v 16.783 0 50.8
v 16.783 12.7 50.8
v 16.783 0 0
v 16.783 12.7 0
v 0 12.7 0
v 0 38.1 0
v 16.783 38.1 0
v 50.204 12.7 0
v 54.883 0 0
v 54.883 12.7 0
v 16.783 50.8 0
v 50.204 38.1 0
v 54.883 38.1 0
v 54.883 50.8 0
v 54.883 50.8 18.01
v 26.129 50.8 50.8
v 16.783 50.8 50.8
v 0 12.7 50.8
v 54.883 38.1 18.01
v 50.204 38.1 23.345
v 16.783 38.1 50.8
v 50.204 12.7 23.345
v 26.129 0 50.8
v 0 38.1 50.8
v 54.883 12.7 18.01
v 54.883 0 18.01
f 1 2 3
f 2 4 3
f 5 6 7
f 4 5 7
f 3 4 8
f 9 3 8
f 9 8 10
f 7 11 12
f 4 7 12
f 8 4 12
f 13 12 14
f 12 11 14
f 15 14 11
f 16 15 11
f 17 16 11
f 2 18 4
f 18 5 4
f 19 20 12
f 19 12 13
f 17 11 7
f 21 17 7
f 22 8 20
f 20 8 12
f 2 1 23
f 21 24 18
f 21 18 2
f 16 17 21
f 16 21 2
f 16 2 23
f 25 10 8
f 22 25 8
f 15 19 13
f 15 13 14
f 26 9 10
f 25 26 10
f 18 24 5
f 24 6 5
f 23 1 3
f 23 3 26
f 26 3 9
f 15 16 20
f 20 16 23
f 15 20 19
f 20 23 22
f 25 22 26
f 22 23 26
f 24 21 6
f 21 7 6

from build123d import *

# Parameters (mm, degrees)
F1_DEPTH = 25.4
F2_DEPTH = 25.4
F4_DEPTH = 68.58


with BuildPart() as f1:
    # F0 (on Top) → F1 (new body)
    with BuildSketch(Plane.XY):
        Polygon((16.782857, 38.1), (0, 38.1), (0, 12.7), (16.782857, 12.7), (16.782857, 0), (29.482857, 0), (29.482857, 50.8), (16.782857, 50.8), align=None)
        Polygon((54.882857, 50.8), (29.482857, 50.8), (29.482857, 0), (54.882857, 0), (54.882857, 12.7), (50.20391, 12.7), (50.20391, 38.099997), (54.882857, 38.099997), align=None)
    extrude(amount=F1_DEPTH)

    # F1_face (on face) → F2 (join)
    with BuildSketch(Plane(origin=(29.731958, 25.4, 25.4), x_dir=(1, 0, 0), z_dir=(0, 0, 1))):
        Polygon((-12.949101, 25.4), (-12.949101, 12.7), (-29.731958, 12.7), (-29.731958, -12.7), (-12.949101, -12.7), (-12.949101, -25.4), (25.150899, -25.4), (25.150899, -12.7), (20.471952, -12.7), (20.471952, 12.699997), (25.150899, 12.699997), (25.150899, 25.4), align=None)
    extrude(amount=F2_DEPTH)

    # F3 (on face) → F4 (cut)
    with BuildSketch(Plane.XZ):
        Polygon((54.882857, 50.8), (26.128728, 50.8), (54.882857, 18.009631), align=None)
    extrude(amount=-F4_DEPTH, mode=Mode.SUBTRACT)


solid = f1.part
